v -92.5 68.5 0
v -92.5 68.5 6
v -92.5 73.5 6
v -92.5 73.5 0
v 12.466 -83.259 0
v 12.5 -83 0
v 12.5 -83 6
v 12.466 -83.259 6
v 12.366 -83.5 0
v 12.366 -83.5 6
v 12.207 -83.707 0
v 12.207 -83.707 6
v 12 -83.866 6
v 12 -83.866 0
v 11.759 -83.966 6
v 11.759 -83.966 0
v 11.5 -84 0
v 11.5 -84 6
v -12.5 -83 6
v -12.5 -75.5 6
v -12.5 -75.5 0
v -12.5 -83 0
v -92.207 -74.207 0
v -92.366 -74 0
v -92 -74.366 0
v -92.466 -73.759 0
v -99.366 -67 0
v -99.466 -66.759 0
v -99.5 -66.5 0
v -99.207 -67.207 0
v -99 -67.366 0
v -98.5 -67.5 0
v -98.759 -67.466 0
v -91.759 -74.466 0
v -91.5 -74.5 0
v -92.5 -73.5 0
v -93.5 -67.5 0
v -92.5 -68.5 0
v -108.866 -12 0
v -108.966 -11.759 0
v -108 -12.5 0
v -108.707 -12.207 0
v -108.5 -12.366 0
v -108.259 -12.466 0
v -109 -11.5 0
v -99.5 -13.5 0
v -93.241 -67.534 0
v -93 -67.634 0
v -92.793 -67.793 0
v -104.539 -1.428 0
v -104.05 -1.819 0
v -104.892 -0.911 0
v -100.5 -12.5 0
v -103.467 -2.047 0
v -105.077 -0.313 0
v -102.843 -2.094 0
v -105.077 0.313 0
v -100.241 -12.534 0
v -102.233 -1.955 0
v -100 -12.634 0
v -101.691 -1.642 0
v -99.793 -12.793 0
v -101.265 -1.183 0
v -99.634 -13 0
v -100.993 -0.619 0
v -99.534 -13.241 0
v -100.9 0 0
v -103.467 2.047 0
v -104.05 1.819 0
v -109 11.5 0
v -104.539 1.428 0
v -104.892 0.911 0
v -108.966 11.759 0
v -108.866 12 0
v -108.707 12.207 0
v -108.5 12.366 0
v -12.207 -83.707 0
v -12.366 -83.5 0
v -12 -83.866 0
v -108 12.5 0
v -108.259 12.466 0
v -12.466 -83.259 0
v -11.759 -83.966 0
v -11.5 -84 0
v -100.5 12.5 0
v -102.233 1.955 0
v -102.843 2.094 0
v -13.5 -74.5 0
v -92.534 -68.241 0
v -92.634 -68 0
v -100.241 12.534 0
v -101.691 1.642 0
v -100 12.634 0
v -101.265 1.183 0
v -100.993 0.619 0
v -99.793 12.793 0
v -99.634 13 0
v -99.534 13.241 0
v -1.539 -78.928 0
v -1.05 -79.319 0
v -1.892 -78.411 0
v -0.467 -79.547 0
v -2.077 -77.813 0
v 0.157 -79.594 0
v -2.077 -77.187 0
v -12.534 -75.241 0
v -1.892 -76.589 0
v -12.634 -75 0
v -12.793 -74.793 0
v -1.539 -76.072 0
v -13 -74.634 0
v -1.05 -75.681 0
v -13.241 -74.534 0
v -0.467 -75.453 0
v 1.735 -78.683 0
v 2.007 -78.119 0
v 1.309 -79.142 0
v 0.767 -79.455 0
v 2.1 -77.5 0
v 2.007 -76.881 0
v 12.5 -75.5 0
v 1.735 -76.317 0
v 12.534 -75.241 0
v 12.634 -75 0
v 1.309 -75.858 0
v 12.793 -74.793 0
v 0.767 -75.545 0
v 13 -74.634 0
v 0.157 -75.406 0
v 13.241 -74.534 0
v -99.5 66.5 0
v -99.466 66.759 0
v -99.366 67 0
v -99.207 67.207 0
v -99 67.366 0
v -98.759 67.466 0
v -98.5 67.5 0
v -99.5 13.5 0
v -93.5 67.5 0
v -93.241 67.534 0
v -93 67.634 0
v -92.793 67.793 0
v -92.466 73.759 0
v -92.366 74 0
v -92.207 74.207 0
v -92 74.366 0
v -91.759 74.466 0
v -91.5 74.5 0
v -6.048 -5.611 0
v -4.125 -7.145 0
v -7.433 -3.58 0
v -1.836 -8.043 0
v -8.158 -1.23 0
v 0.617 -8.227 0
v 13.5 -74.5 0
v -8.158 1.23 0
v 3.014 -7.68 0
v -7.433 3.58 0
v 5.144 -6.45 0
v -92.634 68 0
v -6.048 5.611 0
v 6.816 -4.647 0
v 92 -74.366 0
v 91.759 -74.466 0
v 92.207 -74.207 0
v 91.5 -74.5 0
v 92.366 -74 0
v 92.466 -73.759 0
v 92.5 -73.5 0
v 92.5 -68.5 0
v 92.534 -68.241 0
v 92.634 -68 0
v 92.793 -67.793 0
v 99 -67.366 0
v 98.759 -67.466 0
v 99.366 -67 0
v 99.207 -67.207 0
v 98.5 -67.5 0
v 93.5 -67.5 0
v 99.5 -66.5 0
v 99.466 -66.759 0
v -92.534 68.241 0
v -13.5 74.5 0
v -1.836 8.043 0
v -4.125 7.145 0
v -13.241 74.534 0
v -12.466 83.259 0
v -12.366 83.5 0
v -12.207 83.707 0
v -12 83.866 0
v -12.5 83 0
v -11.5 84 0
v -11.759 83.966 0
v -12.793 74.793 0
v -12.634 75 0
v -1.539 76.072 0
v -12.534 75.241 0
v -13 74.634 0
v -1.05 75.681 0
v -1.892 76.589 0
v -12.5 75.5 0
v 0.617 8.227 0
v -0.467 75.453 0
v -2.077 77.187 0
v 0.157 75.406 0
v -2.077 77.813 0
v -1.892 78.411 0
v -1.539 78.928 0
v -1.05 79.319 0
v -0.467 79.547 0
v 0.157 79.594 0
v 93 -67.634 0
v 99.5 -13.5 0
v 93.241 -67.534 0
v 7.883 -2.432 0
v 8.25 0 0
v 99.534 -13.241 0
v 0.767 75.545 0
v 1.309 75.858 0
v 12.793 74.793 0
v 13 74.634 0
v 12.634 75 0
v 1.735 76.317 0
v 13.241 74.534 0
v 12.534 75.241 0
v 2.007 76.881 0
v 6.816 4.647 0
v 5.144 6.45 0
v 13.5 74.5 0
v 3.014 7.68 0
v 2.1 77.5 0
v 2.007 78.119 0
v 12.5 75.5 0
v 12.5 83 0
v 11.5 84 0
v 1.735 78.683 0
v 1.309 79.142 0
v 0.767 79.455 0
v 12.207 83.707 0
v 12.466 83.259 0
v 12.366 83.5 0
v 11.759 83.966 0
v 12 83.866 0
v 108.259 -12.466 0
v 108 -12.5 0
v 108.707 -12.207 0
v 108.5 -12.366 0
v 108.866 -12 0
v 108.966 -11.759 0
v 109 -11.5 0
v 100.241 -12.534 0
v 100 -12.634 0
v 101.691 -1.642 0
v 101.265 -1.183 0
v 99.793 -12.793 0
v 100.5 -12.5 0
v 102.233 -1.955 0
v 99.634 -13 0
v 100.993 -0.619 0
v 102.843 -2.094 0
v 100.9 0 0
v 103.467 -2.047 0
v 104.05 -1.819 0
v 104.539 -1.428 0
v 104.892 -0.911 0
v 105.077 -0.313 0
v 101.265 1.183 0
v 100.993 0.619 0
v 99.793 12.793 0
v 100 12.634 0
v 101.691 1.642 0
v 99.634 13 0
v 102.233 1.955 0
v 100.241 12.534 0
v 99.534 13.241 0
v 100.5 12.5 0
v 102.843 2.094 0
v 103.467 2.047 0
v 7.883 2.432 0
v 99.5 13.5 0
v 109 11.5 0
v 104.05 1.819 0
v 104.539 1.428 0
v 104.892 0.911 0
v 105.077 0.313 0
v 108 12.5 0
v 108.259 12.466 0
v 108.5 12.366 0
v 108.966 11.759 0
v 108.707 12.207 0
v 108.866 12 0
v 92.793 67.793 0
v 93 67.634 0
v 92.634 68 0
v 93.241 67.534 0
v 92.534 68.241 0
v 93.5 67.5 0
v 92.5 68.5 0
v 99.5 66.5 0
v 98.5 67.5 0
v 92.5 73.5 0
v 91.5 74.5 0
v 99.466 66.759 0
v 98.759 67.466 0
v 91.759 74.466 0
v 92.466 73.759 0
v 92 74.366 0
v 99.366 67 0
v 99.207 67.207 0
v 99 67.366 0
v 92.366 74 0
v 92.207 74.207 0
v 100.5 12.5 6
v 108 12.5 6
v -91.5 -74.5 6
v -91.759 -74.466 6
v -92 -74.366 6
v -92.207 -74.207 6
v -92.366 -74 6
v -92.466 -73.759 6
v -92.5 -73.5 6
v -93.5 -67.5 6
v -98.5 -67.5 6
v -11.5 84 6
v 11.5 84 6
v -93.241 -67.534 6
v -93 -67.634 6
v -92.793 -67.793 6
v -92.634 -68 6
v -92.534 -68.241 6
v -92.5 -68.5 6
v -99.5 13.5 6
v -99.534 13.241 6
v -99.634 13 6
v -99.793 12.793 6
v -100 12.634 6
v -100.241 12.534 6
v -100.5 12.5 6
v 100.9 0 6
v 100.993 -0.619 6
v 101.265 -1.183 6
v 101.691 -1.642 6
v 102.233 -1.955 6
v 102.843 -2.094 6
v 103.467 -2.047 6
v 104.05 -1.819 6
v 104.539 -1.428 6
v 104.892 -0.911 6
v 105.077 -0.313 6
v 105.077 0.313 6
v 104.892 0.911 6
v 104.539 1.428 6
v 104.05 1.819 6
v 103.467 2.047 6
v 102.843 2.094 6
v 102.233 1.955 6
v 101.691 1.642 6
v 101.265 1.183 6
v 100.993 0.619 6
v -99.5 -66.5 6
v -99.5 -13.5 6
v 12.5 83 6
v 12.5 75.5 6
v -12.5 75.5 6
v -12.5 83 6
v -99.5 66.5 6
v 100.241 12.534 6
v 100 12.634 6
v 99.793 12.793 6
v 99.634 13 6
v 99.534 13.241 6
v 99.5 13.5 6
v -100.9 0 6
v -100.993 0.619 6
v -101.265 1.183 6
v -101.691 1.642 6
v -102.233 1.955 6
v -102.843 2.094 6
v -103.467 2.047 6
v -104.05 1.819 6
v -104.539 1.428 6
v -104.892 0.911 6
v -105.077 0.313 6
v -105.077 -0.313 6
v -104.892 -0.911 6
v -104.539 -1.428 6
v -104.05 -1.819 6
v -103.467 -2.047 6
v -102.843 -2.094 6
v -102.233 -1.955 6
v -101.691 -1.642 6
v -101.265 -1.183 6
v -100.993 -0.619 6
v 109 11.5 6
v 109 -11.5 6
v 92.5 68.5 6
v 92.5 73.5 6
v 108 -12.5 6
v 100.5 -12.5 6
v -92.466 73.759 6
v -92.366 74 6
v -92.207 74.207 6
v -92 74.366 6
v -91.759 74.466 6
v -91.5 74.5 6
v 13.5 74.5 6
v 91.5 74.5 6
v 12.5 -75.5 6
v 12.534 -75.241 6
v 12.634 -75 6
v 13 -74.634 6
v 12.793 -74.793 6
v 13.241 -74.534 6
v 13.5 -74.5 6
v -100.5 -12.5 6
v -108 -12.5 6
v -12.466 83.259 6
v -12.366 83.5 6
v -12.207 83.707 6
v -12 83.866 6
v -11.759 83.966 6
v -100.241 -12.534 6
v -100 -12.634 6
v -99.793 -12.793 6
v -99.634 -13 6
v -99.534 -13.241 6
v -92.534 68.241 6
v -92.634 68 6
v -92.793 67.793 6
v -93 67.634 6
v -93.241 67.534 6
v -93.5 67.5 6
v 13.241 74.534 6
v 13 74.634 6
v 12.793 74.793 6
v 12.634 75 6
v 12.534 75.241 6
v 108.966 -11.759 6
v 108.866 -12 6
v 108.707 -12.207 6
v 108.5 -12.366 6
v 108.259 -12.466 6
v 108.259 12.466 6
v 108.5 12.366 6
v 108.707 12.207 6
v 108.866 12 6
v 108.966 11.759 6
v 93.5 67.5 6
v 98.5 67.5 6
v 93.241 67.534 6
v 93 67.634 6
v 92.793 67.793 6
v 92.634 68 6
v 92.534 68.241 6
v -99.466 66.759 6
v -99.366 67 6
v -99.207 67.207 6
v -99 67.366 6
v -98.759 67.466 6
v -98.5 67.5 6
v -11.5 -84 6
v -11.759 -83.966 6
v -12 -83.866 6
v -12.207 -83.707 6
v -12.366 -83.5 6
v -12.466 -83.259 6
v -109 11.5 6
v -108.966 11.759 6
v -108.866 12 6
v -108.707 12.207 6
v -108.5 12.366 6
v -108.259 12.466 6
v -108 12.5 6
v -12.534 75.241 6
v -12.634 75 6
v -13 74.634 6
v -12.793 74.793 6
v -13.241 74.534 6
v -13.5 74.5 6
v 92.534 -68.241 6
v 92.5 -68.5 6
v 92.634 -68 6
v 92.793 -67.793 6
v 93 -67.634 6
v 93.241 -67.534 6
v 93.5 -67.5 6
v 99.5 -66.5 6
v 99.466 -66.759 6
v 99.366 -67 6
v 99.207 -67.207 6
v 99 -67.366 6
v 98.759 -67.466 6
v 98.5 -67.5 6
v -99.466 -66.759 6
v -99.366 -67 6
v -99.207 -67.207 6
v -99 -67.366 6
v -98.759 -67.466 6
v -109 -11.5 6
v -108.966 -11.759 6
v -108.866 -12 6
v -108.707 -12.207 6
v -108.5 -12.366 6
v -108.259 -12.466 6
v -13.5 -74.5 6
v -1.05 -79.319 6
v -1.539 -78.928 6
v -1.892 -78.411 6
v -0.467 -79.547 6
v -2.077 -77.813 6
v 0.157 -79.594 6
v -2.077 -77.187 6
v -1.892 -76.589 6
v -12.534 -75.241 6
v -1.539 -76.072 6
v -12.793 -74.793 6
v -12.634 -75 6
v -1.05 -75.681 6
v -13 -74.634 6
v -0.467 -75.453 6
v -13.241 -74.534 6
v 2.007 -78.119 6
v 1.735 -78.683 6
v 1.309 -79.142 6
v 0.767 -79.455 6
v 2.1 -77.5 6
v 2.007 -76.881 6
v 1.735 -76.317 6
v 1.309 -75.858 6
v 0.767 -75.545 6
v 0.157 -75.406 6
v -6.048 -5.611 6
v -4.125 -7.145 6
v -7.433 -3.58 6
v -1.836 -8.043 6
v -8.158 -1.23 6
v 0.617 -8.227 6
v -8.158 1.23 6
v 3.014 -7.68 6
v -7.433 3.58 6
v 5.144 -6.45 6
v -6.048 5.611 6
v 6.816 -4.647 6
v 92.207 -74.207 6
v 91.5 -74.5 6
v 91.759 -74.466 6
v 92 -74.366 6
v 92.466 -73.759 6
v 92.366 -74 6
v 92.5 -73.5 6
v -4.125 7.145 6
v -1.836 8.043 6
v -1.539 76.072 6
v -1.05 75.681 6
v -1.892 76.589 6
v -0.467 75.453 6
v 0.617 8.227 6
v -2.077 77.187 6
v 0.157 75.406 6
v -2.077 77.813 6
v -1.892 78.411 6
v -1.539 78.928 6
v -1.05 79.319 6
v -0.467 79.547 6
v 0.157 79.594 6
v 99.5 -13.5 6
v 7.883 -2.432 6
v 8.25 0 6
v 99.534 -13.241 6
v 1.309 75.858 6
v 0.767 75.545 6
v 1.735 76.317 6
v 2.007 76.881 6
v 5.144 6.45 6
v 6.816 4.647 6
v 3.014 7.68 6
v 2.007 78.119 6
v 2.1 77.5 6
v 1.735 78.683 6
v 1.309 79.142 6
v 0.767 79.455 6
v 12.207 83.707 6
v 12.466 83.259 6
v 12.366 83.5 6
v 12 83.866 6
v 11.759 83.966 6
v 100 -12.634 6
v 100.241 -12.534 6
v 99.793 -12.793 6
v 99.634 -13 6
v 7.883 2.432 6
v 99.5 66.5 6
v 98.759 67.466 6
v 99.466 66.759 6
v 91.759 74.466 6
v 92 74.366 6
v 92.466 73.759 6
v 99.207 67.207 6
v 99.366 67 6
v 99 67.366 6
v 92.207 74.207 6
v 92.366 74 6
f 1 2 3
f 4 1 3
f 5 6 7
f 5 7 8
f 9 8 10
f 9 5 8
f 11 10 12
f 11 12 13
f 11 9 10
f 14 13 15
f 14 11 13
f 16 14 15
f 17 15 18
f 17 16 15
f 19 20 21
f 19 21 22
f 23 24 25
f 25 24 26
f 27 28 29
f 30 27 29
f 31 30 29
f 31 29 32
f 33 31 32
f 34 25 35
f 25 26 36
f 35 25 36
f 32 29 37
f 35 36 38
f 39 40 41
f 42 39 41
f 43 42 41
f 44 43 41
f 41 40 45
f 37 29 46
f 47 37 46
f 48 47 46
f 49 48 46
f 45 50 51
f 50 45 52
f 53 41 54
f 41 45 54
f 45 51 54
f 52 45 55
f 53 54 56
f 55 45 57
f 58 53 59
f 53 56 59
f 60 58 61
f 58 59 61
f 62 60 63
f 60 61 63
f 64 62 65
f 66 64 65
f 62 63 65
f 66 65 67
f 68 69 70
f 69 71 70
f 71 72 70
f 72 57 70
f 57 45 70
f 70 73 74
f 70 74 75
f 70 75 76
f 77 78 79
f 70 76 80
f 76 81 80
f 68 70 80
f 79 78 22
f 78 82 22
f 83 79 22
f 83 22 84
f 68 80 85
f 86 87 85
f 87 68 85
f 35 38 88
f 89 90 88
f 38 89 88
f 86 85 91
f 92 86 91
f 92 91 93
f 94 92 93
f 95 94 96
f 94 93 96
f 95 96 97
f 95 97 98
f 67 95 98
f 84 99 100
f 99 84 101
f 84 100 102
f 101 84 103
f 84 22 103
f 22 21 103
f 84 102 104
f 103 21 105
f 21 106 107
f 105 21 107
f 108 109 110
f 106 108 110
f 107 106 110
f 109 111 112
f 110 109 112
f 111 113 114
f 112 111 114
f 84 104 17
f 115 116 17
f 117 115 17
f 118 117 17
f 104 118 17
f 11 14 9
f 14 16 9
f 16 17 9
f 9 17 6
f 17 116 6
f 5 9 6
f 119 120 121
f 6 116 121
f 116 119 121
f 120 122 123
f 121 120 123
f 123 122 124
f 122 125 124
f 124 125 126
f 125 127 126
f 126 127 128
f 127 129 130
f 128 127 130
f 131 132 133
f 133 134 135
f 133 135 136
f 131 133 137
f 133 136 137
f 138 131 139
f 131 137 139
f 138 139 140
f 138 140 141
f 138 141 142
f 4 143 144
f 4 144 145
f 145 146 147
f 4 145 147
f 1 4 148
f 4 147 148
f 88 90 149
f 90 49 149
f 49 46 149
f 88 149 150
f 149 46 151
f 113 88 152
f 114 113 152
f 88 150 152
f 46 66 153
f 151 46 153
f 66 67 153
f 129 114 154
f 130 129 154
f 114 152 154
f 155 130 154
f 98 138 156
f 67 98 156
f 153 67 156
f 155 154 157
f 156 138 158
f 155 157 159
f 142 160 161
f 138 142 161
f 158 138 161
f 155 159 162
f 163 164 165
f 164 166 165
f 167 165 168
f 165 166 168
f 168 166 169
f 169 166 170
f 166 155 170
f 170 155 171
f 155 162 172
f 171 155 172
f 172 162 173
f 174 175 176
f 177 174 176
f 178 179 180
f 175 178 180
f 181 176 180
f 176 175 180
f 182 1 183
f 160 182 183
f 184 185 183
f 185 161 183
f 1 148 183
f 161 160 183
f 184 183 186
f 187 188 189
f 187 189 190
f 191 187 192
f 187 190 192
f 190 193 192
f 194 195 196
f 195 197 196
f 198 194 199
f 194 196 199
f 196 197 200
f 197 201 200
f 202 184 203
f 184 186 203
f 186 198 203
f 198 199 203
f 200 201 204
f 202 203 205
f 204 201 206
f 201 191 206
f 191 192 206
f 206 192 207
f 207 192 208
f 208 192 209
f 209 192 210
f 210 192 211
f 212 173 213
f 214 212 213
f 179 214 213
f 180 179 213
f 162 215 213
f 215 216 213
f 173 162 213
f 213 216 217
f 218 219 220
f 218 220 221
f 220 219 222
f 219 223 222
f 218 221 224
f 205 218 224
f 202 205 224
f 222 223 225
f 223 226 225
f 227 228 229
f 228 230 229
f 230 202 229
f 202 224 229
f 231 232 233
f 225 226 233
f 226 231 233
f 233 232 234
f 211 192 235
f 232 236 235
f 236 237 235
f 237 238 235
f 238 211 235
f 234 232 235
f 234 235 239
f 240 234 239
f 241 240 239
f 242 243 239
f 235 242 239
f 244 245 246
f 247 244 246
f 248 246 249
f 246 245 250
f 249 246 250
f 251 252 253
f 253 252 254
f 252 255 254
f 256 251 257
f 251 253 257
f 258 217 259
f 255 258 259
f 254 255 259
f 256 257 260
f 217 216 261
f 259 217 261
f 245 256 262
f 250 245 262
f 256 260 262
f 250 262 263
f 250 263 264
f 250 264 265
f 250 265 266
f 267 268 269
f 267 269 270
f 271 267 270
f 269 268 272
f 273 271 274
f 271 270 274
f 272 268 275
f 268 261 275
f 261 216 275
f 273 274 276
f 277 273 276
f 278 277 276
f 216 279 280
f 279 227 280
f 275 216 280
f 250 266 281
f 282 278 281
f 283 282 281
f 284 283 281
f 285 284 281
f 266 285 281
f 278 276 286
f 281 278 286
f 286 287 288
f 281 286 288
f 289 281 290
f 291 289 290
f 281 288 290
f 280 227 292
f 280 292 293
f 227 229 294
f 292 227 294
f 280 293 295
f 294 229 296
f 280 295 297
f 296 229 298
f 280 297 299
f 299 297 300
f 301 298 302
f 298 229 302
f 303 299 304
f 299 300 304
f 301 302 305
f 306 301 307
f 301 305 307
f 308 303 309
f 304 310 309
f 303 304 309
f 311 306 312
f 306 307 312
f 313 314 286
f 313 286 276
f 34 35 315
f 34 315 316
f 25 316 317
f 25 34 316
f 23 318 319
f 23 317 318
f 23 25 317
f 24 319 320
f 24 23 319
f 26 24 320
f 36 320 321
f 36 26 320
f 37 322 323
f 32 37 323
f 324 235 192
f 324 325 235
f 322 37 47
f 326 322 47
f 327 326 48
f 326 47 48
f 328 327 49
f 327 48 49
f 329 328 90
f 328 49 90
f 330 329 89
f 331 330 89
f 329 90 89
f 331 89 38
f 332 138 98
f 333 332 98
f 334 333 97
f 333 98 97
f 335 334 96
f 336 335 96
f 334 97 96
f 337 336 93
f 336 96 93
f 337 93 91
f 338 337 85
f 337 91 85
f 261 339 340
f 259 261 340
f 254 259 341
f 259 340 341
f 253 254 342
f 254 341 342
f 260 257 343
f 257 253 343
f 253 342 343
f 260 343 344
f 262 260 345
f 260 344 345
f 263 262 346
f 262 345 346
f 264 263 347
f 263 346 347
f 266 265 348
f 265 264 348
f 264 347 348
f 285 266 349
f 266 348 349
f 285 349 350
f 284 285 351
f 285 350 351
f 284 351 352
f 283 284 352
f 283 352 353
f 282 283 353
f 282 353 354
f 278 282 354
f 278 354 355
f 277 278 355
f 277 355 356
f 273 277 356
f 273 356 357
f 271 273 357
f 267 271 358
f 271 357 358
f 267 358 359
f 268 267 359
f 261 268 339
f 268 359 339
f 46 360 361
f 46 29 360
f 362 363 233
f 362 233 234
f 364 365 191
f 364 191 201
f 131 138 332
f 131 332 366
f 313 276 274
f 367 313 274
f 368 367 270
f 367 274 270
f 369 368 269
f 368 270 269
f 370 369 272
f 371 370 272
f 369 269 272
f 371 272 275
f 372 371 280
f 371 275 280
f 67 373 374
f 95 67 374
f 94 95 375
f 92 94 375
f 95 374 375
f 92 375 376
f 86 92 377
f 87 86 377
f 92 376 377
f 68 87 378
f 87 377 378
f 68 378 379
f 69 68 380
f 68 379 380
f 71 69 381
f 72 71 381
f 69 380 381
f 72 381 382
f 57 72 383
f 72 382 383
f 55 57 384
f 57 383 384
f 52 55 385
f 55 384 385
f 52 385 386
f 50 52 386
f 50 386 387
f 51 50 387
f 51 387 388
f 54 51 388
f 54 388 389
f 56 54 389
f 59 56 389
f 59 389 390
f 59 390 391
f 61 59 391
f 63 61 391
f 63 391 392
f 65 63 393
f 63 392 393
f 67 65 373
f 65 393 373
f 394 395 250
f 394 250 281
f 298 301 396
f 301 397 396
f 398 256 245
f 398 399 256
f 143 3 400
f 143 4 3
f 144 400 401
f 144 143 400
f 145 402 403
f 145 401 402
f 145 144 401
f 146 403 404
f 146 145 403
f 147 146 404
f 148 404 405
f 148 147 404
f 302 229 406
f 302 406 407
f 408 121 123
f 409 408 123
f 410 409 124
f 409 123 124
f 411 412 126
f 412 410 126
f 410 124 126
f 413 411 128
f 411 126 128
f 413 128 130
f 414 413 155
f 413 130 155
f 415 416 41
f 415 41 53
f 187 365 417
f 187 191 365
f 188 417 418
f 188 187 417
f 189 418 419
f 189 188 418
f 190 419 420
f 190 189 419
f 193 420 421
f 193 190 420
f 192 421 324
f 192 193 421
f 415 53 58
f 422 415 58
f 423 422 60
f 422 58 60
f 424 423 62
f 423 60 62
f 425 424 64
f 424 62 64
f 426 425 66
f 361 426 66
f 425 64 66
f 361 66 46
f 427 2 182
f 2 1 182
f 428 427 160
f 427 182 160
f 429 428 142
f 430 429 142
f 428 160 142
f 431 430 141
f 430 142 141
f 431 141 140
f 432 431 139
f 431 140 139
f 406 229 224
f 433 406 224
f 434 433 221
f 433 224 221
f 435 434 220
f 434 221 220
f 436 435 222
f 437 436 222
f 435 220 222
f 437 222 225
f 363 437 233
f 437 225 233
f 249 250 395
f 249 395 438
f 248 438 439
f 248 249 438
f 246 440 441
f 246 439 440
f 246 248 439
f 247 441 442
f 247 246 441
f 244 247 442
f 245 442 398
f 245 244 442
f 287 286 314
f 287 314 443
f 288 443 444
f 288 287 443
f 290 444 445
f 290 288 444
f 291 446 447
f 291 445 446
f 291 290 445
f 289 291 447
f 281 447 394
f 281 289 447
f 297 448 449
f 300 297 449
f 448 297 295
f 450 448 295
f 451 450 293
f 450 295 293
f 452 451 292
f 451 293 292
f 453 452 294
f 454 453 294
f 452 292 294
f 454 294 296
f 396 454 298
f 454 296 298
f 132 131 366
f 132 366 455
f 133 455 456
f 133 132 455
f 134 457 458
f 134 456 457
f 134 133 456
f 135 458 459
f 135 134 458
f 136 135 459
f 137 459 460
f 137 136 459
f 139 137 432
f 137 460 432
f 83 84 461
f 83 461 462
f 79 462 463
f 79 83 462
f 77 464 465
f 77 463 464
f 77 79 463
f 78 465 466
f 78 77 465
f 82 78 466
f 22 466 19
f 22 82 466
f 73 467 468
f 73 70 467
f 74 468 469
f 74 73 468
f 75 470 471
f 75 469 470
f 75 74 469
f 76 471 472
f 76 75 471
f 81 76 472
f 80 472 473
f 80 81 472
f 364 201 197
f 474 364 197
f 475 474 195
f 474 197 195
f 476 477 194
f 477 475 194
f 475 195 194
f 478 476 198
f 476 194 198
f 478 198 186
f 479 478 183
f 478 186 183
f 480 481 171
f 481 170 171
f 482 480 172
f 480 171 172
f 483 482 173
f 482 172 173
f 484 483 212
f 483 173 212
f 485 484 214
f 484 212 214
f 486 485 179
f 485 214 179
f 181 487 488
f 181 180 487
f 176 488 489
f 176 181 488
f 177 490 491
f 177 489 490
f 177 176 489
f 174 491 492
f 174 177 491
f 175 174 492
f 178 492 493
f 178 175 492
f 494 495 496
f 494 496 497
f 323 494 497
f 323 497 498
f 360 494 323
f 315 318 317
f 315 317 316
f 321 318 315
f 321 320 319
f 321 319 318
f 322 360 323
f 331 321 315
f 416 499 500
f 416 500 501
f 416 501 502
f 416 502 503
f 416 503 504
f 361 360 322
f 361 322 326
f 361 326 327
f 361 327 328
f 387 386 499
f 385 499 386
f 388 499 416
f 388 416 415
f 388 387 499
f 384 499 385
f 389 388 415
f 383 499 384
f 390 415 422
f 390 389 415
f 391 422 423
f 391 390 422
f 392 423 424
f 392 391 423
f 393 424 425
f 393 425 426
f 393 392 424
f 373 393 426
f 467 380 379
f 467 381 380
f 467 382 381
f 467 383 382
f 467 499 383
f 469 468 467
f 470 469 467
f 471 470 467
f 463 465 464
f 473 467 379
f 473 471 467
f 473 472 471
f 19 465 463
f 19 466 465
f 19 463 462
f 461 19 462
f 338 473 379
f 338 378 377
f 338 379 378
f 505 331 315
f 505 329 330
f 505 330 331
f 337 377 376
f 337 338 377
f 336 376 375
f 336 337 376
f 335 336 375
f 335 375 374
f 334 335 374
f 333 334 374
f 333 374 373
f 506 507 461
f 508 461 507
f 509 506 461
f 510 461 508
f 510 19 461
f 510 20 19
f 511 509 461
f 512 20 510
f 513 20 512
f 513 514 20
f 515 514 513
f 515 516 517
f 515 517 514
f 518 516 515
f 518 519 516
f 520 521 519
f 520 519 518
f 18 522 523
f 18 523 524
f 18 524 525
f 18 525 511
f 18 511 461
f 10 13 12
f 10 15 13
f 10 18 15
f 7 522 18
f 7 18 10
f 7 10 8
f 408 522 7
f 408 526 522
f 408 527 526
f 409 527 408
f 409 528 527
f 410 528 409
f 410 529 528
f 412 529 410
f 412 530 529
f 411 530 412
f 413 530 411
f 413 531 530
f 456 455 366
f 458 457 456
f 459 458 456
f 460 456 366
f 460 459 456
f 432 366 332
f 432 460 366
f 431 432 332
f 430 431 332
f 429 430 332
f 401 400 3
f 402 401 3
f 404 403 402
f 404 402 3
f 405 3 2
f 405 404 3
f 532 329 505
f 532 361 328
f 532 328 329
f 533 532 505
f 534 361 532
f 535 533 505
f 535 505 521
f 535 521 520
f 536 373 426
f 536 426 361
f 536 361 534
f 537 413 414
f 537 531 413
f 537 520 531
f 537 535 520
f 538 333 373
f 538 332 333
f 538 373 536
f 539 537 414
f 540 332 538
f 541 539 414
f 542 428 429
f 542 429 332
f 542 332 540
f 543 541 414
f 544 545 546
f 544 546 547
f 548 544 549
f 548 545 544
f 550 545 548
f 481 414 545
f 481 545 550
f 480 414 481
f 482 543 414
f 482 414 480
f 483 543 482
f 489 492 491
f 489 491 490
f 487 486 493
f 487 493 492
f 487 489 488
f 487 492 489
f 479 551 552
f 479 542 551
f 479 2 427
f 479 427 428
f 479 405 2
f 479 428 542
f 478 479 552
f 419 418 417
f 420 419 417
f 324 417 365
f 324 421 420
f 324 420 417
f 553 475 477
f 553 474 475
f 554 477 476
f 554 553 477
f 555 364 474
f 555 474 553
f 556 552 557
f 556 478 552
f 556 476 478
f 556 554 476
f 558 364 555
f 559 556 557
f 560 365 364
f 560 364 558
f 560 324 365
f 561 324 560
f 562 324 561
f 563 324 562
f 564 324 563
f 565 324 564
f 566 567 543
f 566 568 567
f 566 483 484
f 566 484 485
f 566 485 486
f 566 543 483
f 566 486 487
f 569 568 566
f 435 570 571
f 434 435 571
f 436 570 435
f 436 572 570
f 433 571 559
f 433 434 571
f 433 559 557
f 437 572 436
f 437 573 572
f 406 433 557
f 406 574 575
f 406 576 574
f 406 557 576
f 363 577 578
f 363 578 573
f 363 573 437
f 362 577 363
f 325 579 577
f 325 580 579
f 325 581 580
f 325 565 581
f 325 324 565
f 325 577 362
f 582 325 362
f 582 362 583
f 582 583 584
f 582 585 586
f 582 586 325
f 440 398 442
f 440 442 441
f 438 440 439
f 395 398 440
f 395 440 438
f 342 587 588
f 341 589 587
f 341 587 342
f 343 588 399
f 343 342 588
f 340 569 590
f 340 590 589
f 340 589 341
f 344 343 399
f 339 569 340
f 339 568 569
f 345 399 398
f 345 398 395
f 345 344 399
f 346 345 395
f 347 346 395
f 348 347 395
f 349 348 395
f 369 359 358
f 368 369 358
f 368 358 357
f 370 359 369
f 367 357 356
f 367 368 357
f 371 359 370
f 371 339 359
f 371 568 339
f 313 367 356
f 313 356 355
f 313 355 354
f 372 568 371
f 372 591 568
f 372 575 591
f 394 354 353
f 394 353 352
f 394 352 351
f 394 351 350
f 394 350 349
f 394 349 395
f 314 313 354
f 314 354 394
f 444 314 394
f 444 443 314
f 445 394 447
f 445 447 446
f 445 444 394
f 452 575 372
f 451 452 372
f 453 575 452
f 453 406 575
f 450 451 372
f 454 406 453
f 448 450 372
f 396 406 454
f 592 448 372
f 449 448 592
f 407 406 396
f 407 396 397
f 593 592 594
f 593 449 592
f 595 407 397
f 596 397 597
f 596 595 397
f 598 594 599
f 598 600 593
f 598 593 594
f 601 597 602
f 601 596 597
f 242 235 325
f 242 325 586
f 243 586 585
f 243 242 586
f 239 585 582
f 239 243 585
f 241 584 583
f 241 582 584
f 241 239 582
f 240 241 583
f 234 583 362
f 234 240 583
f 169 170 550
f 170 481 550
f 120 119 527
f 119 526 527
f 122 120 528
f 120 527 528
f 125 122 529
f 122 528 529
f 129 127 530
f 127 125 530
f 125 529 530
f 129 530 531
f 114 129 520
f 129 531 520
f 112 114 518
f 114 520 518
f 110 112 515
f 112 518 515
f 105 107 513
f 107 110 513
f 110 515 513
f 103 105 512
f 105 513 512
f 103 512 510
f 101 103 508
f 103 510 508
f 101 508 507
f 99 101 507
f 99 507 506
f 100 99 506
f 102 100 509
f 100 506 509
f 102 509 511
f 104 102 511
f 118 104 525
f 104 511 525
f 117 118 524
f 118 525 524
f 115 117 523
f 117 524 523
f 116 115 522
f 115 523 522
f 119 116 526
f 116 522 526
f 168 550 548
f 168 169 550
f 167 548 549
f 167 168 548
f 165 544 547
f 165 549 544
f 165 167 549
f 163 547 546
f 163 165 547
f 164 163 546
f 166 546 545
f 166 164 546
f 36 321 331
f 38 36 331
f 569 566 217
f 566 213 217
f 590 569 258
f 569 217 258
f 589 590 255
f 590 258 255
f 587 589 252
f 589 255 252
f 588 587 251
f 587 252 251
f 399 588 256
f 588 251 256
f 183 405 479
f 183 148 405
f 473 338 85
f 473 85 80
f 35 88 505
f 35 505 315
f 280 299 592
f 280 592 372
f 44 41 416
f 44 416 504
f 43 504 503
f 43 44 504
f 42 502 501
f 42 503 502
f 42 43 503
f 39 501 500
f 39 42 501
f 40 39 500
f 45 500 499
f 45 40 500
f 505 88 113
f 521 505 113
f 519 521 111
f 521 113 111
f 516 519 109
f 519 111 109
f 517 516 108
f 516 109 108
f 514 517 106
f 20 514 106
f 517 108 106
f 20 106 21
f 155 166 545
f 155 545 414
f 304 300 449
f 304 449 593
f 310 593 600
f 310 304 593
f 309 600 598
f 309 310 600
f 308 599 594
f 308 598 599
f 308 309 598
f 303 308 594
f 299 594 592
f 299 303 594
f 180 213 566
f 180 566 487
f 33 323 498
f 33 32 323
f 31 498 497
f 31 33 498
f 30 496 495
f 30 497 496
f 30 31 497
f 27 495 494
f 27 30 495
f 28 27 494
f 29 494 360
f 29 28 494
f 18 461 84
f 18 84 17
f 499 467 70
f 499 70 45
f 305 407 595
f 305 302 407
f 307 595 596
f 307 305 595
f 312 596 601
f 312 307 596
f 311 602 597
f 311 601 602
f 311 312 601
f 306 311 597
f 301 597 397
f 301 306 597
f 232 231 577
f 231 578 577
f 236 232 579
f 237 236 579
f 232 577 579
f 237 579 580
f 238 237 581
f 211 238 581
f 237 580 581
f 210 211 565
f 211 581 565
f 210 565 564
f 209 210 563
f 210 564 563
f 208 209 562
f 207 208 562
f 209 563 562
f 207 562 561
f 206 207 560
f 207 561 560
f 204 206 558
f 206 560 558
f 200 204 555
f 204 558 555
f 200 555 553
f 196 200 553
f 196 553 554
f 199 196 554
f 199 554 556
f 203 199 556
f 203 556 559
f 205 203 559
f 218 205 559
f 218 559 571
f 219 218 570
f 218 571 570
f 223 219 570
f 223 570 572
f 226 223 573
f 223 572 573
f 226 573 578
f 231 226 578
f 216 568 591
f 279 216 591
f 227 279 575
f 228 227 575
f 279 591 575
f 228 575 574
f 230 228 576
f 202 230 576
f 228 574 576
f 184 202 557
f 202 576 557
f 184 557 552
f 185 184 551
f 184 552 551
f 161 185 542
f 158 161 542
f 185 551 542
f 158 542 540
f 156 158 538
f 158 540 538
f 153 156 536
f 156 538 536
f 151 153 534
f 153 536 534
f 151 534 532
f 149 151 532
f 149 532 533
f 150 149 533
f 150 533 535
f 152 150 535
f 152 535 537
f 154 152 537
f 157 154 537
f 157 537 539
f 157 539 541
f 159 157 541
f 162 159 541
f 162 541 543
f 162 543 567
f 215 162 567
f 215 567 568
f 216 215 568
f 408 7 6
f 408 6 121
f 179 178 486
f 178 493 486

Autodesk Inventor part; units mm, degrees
sketch "Sketch1" plane through (0, 0, 0) normal (0, 0, 1) x (1, 0, 0)
  line L0 (-99.5, 74.5) -> (99.5, 74.5)
  line L1 (99.5, 74.5) -> (99.5, -74.5)
  line L2 (99.5, -74.5) -> (-99.5, -74.5)
  line L3 (-99.5, -74.5) -> (-99.5, 74.5)
  point P0 (0, 74.5)
  point P1 (0, 0)
  point P2 (-99.5, 0)
  dimension "d0" = 199
  dimension "d1" = 149
extrude "Extrusion1" add sketch "Sketch1" along normal blind 6
sketch "Sketch2" plane through (0, 0, 6) normal (0, 0, 1) x (1, 0, 0)
  line L0 (-99.5, -74.5) -> (99.5, -74.5) projected
  line L1 (-99.5, -74.5) -> (-92.5, -74.5)
  line L2 (-92.5, -74.5) -> (-92.5, -67.5)
  line L3 (-92.5, -67.5) -> (-99.5, -67.5)
  line L4 (-99.5, -67.5) -> (-99.5, -74.5)
  point P0 (0, 0)
  point P1 (40.5, -62.5)
  dimension "d18" = 7
  dimension "d19" = 7
extrude "Extrusion2" cut sketch "Sketch2" against normal blind 15
mirror "Mirror3" about plane through (0, 0, 0) normal (1, 0, 0) of "Extrusion2"
mirror "Mirror4" about plane through (0, 0, 0) normal (0, 1, 0) of "Extrusion2", "Mirror3"
sketch "Sketch4" plane through (0, 0, 6) normal (0, 0, 1) x (1, 0, 0)
  line L0 (-99.5, 67.5) -> (-99.5, -67.5) projected
  line L1 (-99.5, 12.5) -> (-109, 12.5)
  line L2 (-109, 12.5) -> (-109, -12.5)
  line L3 (-109, -12.5) -> (-99.5, -12.5)
  line L4 (-99.5, -12.5) -> (-99.5, 12.5)
  line L5 (-99.5, 0) -> (-103, 0) construction
  circle A0 centre (-103, 0) radius 2.1
  point P0 (0, 0)
  point P1 (-82, 49)
  point P2 (-82, -49)
  point P3 (-99.5, 0)
  point P4 (-99.5, -67.5)
  dimension "d23" = 9.5
  dimension "d24" = 25
  dimension "d34" = 3.5
  dimension "d35" = 4.2
extrude "Extrusion4" add sketch "Sketch4" against normal blind 6
mirror "Mirror5" about plane through (0, 0, 0) normal (1, 0, 0) of "Extrusion4"
sketch "Sketch6" plane through (0, 0, 6) normal (0, 0, 1) x (1, 0, 0)
  line L0 (92.5, 74.5) -> (-92.5, 74.5) projected
  line L1 (-12.5, 74.5) -> (12.5, 74.5)
  line L2 (12.5, 74.5) -> (12.5, 84)
  line L3 (12.5, 84) -> (-12.5, 84)
  line L4 (-12.5, 84) -> (-12.5, 74.5)
  circle A0 centre (0, 77.5) radius 2.1
  line L5 (0, 74.5) -> (0, 77.5) construction
  point P0 (0, 0)
  dimension "d28" = 25
  dimension "d29" = 9.5
  dimension "d30" = 4.2
  dimension "d36" = 3
extrude "Extrusion5" add sketch "Sketch6" against normal blind 6
mirror "Mirror6" about plane through (0, 0, 0) normal (0, 1, 0) of "Extrusion5"
fillet "Fillet4" radius 1 28 edges at (-109, -12.5, 3) (-99.5, -12.5, 3) (-99.5, -67.5, 3) (-92.5, -67.5, 3) (-92.5, -74.5, 3) (-12.5, -74.5, 3) (-12.5, -84, 3) (12.5, -84, 3) (92.5, -74.5, 3) (99.5, -67.5, 3) (12.5, -74.5, 3) (92.5, -67.5, 3) (99.5, -12.5, 3) (109, -12.5, 3) (109, 12.5, 3) (99.5, 67.5, 3) (92.5, 74.5, 3) (12.5, 84, 3) (92.5, 67.5, 3) (99.5, 12.5, 3) (-12.5, 84, 3) (-92.5, 74.5, 3) (-99.5, 67.5, 3) (-12.5, 74.5, 3) (-92.5, 67.5, 3) (-99.5, 12.5, 3) (-109, 12.5, 3) (12.5, 74.5, 3)
sketch "Sketch7" plane through (0, 0, 6) normal (0, 0, 1) x (1, 0, 0)
  circle A0 centre (0, 0) radius 8.25
  dimension "d38" = 16.5
extrude "Extrusion6" cut sketch "Sketch7" against normal through all
equation "\"d7\" = d5"
equation "\"d5\" = 15"
properties part number "MDF_Base" material "MDF Medium Density Fiberboard"
